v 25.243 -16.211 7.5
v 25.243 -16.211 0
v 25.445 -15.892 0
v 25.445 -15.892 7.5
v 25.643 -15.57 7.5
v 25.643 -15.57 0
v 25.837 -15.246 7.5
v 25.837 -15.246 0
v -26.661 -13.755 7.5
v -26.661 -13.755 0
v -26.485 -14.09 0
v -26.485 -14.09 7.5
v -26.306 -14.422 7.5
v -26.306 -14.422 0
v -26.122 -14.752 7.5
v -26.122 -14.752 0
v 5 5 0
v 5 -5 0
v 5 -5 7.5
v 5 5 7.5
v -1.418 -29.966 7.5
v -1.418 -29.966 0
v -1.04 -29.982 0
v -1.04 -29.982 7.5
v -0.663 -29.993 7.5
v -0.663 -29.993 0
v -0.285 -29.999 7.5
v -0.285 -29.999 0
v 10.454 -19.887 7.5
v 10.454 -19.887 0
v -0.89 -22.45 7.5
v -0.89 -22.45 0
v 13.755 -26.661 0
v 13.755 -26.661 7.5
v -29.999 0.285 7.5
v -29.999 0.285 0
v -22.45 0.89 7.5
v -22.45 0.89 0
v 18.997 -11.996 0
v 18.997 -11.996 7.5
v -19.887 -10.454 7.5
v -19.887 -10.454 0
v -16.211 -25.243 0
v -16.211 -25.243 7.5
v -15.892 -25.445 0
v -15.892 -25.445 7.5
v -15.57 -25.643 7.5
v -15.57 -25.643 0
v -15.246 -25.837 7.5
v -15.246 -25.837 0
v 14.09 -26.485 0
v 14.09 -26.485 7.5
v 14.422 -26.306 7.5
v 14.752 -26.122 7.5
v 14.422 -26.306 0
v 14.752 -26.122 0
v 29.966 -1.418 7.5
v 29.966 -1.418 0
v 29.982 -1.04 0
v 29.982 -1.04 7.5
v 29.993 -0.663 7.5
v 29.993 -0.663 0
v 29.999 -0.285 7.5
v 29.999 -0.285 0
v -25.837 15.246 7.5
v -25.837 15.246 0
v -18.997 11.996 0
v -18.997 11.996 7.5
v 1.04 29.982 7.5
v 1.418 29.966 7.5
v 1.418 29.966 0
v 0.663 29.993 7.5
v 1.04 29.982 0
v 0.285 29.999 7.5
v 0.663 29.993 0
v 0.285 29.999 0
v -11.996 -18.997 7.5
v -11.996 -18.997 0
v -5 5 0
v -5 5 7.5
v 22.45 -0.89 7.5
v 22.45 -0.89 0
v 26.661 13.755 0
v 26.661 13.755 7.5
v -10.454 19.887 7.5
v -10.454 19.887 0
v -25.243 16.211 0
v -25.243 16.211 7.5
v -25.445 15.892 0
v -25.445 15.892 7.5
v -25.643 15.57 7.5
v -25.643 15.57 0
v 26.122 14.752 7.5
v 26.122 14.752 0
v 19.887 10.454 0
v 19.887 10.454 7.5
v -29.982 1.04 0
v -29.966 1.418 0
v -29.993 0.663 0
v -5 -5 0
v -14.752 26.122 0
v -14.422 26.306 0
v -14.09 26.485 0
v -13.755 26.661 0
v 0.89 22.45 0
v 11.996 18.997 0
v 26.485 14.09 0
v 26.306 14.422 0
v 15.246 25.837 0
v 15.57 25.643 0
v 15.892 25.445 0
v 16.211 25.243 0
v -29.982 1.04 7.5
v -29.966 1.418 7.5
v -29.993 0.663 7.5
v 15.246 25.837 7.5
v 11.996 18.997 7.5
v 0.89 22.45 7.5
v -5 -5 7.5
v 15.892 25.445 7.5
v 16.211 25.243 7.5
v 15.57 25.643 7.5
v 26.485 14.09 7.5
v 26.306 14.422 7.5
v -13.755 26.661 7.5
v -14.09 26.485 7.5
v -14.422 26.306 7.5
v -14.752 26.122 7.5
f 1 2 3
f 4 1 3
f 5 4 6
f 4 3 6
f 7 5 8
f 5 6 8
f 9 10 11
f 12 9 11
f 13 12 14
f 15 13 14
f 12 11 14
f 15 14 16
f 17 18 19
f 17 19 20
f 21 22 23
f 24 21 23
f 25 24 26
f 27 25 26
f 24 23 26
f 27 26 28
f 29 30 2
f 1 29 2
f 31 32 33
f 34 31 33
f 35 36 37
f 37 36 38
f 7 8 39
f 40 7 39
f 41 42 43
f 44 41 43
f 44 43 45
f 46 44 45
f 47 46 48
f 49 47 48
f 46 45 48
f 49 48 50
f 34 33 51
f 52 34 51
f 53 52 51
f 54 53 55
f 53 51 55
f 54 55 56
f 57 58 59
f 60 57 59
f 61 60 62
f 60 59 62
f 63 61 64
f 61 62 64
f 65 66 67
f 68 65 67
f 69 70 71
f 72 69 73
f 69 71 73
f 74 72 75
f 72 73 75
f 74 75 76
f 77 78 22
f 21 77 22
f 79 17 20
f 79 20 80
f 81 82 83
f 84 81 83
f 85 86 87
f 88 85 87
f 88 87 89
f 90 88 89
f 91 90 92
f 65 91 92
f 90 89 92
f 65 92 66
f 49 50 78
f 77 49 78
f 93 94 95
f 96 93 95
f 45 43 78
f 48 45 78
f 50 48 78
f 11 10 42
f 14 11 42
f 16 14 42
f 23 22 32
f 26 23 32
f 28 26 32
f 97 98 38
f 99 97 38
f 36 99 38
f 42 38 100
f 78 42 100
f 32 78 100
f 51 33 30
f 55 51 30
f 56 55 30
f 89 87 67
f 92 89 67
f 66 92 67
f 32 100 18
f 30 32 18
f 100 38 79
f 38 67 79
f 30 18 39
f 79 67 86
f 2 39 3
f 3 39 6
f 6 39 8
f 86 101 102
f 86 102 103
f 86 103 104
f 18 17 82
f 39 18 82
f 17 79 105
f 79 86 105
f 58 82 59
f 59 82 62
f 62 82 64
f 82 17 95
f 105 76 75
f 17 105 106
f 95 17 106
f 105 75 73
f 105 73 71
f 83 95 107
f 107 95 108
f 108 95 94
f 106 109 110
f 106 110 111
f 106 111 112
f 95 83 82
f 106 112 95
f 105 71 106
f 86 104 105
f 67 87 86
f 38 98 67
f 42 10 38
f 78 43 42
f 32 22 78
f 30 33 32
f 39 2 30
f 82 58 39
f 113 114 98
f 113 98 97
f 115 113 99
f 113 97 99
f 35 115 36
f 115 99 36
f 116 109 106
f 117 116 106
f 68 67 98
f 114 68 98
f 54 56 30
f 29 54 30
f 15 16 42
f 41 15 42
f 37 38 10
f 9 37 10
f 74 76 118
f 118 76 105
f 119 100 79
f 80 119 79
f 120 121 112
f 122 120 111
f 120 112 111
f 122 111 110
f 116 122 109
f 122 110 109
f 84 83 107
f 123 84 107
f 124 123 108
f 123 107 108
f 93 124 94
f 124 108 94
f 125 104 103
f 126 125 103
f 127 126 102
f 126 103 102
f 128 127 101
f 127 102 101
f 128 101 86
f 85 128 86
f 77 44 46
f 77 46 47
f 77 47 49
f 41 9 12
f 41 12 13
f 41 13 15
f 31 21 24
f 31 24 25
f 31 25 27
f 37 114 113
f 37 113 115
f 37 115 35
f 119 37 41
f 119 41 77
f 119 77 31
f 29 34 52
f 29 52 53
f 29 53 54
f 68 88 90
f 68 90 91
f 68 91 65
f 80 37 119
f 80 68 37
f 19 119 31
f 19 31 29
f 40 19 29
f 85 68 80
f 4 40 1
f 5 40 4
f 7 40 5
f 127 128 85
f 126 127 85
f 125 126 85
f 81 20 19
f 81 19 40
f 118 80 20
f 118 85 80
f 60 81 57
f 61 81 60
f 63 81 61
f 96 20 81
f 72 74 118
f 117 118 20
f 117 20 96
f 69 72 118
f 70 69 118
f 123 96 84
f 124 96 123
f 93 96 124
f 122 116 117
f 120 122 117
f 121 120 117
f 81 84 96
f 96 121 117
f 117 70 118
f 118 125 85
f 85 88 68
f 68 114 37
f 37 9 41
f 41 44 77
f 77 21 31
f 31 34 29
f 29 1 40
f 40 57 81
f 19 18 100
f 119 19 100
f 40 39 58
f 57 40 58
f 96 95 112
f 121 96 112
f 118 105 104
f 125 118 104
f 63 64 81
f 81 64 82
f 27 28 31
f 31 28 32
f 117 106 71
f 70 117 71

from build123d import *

# Parameters (mm, degrees)
SCHIZZO2_R                   = 30
ESTRUSIONE_ESTRUSIONE1_DEPTH = 7.5
SCHIZZO3_W                   = 10
SCHIZZO3_H                   = 10
TAGLIO_ESTRUSIONE1_DEPTH     = 44.084219849
TAGLIO_ESTRUSIONE2_DEPTH     = 44.084219849


with BuildPart() as part:
    # Schizzo2 → Estrusione-Estrusione1 (new body)
    with BuildSketch(Plane.XY):
        Circle(SCHIZZO2_R)
    extrude(amount=ESTRUSIONE_ESTRUSIONE1_DEPTH)

    # Schizzo3 → Taglio-Estrusione1 (cut, through all)
    with BuildSketch(Plane(origin=(0, 0, 0), x_dir=(-1, 0, 0), z_dir=(0, 0, -1))):
        Rectangle(SCHIZZO3_W, SCHIZZO3_H)
    extrude(amount=-TAGLIO_ESTRUSIONE1_DEPTH, mode=Mode.SUBTRACT)

    # Schizzo4 → Taglio-Estrusione2 (cut, through all)
    with BuildSketch(Plane(origin=(0, 0, 0), x_dir=(-1, 0, 0), z_dir=(0, 0, -1))):
        with BuildLine():
            Line((-0.285302534, 29.998643344), (-0.89, 22.45))
            Line((-0.89, 22.45), (13.755471769, 26.660588823))
            ThreePointArc((13.755471769, 26.660588823), (6.938805142, 29.186520574), (-0.285302534, 29.998643344))
        make_face()
        with BuildLine():
            Line((10.454237391, 19.887270315), (25.242882405, 16.211011316))
            ThreePointArc((25.242882405, 16.211011316), (20.602441812, 21.806865694), (14.75224243, 26.122238482))
            Line((14.75224243, 26.122238482), (10.454237391, 19.887270315))
        make_face()
        with BuildLine():
            Line((18.997270315, 11.995762609), (29.966483085, 1.417706418))
            ThreePointArc((29.966483085, 1.417706418), (28.745670836, 8.584078762), (25.836935948, 15.246400914))
            Line((25.836935948, 15.246400914), (18.997270315, 11.995762609))
        make_face()
        with BuildLine():
            Line((22.45, 0.89), (26.660588823, -13.755471769))
            ThreePointArc((26.660588823, -13.755471769), (29.186520574, -6.938805142), (29.998643344, 0.285302534))
            Line((29.998643344, 0.285302534), (22.45, 0.89))
        make_face()
        with BuildLine():
            Line((19.887270315, -10.454237391), (16.211011316, -25.242882405))
            ThreePointArc((16.211011316, -25.242882405), (21.806865694, -20.602441812), (26.122238482, -14.75224243))
            Line((26.122238482, -14.75224243), (19.887270315, -10.454237391))
        make_face()
        with BuildLine():
            Line((11.995762609, -18.997270315), (1.417706418, -29.966483085))
            ThreePointArc((1.417706418, -29.966483085), (8.584078762, -28.745670836), (15.246400914, -25.836935948))
            Line((15.246400914, -25.836935948), (11.995762609, -18.997270315))
        make_face()
        with BuildLine():
            Line((0.89, -22.45), (-13.755471769, -26.660588823))
            ThreePointArc((-13.755471769, -26.660588823), (-6.938805142, -29.186520574), (0.285302534, -29.998643344))
            Line((0.285302534, -29.998643344), (0.89, -22.45))
        make_face()
        with BuildLine():
            Line((-10.454237391, -19.887270315), (-25.242882405, -16.211011316))
            ThreePointArc((-25.242882405, -16.211011316), (-20.602441812, -21.806865694), (-14.75224243, -26.122238482))
            Line((-14.75224243, -26.122238482), (-10.454237391, -19.887270315))
        make_face()
        with BuildLine():
            Line((-18.997270315, -11.995762609), (-29.966483085, -1.417706418))
            ThreePointArc((-29.966483085, -1.417706418), (-28.745670836, -8.584078762), (-25.836935948, -15.246400914))
            Line((-25.836935948, -15.246400914), (-18.997270315, -11.995762609))
        make_face()
        with BuildLine():
            Line((-22.45, -0.89), (-26.660588823, 13.755471769))
            ThreePointArc((-26.660588823, 13.755471769), (-29.186520574, 6.938805142), (-29.998643344, -0.285302534))
            Line((-29.998643344, -0.285302534), (-22.45, -0.89))
        make_face()
        with BuildLine():
            Line((-19.887270315, 10.454237391), (-16.211011316, 25.242882405))
            ThreePointArc((-16.211011316, 25.242882405), (-21.806865694, 20.602441812), (-26.122238482, 14.75224243))
            Line((-26.122238482, 14.75224243), (-19.887270315, 10.454237391))
        make_face()
        with BuildLine():
            Line((-11.995762609, 18.997270315), (-1.417706418, 29.966483085))
            ThreePointArc((-1.417706418, 29.966483085), (-8.584078762, 28.745670836), (-15.246400914, 25.836935948))
            Line((-15.246400914, 25.836935948), (-11.995762609, 18.997270315))
        make_face()
    extrude(amount=-TAGLIO_ESTRUSIONE2_DEPTH, mode=Mode.SUBTRACT)


solid = part.part
